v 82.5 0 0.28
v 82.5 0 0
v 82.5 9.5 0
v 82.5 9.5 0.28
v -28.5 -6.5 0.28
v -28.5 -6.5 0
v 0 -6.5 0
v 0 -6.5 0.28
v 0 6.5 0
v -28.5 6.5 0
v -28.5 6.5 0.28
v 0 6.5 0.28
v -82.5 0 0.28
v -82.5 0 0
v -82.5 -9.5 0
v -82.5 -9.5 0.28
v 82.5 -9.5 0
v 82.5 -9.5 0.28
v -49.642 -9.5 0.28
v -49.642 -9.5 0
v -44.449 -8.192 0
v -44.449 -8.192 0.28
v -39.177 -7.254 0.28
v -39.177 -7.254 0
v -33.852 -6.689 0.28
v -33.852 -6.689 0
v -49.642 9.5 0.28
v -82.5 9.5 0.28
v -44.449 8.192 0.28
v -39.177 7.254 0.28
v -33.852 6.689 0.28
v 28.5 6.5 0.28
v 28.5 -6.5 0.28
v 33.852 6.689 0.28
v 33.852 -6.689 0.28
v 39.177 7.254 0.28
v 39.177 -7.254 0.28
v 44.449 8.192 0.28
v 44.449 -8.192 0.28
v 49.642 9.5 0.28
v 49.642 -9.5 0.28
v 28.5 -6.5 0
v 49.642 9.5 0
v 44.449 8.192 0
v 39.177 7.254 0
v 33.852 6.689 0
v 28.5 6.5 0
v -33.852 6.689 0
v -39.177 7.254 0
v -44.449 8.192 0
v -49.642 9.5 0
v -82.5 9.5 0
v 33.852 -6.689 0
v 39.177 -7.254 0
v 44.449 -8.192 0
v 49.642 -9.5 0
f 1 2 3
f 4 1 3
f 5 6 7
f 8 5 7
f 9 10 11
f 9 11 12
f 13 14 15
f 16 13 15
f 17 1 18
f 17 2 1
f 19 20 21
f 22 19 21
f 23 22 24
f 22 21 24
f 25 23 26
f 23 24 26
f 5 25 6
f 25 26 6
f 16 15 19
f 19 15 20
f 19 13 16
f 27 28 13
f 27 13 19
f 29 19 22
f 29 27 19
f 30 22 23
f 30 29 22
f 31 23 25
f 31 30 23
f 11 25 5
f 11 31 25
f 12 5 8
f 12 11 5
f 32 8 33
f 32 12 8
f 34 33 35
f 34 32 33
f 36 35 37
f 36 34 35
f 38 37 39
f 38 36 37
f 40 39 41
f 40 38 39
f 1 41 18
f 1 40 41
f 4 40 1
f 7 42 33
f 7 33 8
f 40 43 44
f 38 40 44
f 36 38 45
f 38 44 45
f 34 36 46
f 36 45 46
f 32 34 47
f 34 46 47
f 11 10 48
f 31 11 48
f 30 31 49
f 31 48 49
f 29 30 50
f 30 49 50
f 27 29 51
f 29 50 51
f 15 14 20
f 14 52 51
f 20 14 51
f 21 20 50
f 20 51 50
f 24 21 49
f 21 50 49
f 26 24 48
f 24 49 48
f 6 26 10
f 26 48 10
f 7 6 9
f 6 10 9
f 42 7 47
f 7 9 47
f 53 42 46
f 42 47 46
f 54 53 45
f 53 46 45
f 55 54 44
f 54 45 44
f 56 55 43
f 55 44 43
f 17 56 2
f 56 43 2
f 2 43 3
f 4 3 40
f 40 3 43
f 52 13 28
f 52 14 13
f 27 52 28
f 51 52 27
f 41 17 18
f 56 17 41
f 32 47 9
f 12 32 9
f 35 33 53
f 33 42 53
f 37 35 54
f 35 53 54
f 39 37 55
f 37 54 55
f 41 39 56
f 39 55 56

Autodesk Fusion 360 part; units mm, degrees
sketch "Esquisse1" plane through (0, 0, 0) normal (0, 0, 1) x (1, 0, 0)
  line L0 (-28.5, 6.5) -> (0, 6.5)
  line L1 (0, 6.5) -> (0, 0) construction
  line L2 (0, 0) -> (-35.4205, 0) construction
  line L3 (-82.5, 9.5) -> (-49.6424, 9.5)
  line L4 (-35.4205, 0) -> (-82.5, 0) construction
  line L5 (-82.5, 0) -> (-82.5, 9.5)
  arc A0 (-49.6424, 9.5) -> (-28.5, 6.5) centre (-28.5, 82.5) ccw
  line L6 (-28.5, -6.5) -> (0, -6.5)
  arc A1 (-28.5, -6.5) -> (-49.6424, -9.5) centre (-28.5, -82.5) ccw
  line L7 (-82.5, -9.5) -> (-49.6424, -9.5)
  line L8 (-82.5, 0) -> (-82.5, -9.5)
  arc A2 (49.6424, -9.5) -> (28.5, -6.5) centre (28.5, -82.5) ccw
  line L9 (28.5, -6.5) -> (0, -6.5)
  line L10 (82.5, -9.5) -> (49.6424, -9.5)
  line L11 (82.5, 0) -> (82.5, -9.5)
  line L12 (82.5, 0) -> (82.5, 9.5)
  line L13 (82.5, 9.5) -> (49.6424, 9.5)
  arc A3 (28.5, 6.5) -> (49.6424, 9.5) centre (28.5, 82.5) ccw
  line L14 (28.5, 6.5) -> (0, 6.5)
  dimension "d1" = 28.5
  dimension "d9" = 6.5
  dimension "d10" = 152
  dimension "d13" = 82.5
  dimension "d14" = 9.5
extrude "Extrusion1" add sketch "Esquisse1" along normal blind 0.28
equation "d1 = Ln / 2"
equation "Wn = 13 mm" comment "Width of narrow section"
equation "Ln = 57 mm" comment "Length of narrow section"
equation "Wo = 19 mm" comment "Width overall, min"
equation "Lo = 165 mm" comment "Length overall, min"
equation "Dg = 10 mm" comment "Distance between grips"
equation "Rf = 76 mm" comment "Radius of fillet"
equation "d9 = Wn / 2"
equation "d10 = Rf * 2"
equation "d13 = Lo / 2"
equation "d14 = Wo / 2"
equation "To = 0.28 mm" comment "Thickness"
equation "d16 = To"
